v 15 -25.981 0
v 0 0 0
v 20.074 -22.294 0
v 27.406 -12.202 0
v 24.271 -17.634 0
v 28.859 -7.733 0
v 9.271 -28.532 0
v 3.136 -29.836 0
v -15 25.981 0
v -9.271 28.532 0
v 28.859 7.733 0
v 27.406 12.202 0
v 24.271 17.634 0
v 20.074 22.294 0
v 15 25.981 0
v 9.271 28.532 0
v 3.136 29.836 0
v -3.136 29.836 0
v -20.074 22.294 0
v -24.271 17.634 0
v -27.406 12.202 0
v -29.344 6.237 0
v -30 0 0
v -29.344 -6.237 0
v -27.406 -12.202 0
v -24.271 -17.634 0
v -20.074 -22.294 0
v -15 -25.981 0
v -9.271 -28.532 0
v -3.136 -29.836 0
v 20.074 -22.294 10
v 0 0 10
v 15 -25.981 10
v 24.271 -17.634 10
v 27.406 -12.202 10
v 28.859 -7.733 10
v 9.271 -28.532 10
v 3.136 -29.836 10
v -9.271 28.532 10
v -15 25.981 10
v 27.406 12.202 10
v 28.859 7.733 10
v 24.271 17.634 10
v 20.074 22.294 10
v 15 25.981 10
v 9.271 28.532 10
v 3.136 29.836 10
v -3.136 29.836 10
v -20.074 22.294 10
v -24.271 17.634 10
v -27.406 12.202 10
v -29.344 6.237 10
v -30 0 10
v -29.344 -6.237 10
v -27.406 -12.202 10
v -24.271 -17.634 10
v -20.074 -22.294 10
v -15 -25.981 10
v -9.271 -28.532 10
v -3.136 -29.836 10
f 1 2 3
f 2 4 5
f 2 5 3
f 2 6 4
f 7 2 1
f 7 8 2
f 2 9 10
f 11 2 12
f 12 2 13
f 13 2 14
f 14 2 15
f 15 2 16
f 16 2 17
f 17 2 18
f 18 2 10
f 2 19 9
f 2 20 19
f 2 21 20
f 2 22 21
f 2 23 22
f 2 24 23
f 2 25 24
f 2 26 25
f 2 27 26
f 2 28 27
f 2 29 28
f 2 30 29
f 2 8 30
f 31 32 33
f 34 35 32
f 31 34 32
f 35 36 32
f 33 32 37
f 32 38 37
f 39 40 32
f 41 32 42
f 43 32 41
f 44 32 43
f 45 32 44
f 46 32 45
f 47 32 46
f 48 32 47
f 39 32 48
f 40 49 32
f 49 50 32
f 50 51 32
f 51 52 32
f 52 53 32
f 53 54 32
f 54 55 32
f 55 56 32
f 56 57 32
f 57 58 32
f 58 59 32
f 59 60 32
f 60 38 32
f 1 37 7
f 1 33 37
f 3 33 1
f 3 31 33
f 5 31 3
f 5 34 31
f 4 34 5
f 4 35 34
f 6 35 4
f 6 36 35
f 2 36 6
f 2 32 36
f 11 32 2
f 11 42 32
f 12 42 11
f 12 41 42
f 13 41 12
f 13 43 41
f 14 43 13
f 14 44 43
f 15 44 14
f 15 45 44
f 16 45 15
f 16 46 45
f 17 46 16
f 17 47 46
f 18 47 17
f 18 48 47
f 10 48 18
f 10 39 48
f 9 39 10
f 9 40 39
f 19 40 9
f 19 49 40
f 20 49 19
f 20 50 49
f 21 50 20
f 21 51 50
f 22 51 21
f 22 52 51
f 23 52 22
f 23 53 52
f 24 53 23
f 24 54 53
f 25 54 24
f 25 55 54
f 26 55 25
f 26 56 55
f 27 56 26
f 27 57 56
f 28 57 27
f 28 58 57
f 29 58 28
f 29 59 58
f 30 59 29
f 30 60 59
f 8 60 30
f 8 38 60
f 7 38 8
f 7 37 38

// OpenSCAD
// Unit of length: Unit.INCH
linear_extrude(height = 10.0, center = false, twist = 0.0, scale = 1.0)
{
   intersection()
   {
      circle(d = 60.0, $fa = 12.0, $fs = 2.0, $fn = 0);
      polygon(points = [[0.0, 0.0], [33.4718, 8.9687], [0.0, 42.4405], [-42.4405, 0.0], [0.0, -42.4405], [33.4718, -8.9687]], convexity = 2);
   }
}
